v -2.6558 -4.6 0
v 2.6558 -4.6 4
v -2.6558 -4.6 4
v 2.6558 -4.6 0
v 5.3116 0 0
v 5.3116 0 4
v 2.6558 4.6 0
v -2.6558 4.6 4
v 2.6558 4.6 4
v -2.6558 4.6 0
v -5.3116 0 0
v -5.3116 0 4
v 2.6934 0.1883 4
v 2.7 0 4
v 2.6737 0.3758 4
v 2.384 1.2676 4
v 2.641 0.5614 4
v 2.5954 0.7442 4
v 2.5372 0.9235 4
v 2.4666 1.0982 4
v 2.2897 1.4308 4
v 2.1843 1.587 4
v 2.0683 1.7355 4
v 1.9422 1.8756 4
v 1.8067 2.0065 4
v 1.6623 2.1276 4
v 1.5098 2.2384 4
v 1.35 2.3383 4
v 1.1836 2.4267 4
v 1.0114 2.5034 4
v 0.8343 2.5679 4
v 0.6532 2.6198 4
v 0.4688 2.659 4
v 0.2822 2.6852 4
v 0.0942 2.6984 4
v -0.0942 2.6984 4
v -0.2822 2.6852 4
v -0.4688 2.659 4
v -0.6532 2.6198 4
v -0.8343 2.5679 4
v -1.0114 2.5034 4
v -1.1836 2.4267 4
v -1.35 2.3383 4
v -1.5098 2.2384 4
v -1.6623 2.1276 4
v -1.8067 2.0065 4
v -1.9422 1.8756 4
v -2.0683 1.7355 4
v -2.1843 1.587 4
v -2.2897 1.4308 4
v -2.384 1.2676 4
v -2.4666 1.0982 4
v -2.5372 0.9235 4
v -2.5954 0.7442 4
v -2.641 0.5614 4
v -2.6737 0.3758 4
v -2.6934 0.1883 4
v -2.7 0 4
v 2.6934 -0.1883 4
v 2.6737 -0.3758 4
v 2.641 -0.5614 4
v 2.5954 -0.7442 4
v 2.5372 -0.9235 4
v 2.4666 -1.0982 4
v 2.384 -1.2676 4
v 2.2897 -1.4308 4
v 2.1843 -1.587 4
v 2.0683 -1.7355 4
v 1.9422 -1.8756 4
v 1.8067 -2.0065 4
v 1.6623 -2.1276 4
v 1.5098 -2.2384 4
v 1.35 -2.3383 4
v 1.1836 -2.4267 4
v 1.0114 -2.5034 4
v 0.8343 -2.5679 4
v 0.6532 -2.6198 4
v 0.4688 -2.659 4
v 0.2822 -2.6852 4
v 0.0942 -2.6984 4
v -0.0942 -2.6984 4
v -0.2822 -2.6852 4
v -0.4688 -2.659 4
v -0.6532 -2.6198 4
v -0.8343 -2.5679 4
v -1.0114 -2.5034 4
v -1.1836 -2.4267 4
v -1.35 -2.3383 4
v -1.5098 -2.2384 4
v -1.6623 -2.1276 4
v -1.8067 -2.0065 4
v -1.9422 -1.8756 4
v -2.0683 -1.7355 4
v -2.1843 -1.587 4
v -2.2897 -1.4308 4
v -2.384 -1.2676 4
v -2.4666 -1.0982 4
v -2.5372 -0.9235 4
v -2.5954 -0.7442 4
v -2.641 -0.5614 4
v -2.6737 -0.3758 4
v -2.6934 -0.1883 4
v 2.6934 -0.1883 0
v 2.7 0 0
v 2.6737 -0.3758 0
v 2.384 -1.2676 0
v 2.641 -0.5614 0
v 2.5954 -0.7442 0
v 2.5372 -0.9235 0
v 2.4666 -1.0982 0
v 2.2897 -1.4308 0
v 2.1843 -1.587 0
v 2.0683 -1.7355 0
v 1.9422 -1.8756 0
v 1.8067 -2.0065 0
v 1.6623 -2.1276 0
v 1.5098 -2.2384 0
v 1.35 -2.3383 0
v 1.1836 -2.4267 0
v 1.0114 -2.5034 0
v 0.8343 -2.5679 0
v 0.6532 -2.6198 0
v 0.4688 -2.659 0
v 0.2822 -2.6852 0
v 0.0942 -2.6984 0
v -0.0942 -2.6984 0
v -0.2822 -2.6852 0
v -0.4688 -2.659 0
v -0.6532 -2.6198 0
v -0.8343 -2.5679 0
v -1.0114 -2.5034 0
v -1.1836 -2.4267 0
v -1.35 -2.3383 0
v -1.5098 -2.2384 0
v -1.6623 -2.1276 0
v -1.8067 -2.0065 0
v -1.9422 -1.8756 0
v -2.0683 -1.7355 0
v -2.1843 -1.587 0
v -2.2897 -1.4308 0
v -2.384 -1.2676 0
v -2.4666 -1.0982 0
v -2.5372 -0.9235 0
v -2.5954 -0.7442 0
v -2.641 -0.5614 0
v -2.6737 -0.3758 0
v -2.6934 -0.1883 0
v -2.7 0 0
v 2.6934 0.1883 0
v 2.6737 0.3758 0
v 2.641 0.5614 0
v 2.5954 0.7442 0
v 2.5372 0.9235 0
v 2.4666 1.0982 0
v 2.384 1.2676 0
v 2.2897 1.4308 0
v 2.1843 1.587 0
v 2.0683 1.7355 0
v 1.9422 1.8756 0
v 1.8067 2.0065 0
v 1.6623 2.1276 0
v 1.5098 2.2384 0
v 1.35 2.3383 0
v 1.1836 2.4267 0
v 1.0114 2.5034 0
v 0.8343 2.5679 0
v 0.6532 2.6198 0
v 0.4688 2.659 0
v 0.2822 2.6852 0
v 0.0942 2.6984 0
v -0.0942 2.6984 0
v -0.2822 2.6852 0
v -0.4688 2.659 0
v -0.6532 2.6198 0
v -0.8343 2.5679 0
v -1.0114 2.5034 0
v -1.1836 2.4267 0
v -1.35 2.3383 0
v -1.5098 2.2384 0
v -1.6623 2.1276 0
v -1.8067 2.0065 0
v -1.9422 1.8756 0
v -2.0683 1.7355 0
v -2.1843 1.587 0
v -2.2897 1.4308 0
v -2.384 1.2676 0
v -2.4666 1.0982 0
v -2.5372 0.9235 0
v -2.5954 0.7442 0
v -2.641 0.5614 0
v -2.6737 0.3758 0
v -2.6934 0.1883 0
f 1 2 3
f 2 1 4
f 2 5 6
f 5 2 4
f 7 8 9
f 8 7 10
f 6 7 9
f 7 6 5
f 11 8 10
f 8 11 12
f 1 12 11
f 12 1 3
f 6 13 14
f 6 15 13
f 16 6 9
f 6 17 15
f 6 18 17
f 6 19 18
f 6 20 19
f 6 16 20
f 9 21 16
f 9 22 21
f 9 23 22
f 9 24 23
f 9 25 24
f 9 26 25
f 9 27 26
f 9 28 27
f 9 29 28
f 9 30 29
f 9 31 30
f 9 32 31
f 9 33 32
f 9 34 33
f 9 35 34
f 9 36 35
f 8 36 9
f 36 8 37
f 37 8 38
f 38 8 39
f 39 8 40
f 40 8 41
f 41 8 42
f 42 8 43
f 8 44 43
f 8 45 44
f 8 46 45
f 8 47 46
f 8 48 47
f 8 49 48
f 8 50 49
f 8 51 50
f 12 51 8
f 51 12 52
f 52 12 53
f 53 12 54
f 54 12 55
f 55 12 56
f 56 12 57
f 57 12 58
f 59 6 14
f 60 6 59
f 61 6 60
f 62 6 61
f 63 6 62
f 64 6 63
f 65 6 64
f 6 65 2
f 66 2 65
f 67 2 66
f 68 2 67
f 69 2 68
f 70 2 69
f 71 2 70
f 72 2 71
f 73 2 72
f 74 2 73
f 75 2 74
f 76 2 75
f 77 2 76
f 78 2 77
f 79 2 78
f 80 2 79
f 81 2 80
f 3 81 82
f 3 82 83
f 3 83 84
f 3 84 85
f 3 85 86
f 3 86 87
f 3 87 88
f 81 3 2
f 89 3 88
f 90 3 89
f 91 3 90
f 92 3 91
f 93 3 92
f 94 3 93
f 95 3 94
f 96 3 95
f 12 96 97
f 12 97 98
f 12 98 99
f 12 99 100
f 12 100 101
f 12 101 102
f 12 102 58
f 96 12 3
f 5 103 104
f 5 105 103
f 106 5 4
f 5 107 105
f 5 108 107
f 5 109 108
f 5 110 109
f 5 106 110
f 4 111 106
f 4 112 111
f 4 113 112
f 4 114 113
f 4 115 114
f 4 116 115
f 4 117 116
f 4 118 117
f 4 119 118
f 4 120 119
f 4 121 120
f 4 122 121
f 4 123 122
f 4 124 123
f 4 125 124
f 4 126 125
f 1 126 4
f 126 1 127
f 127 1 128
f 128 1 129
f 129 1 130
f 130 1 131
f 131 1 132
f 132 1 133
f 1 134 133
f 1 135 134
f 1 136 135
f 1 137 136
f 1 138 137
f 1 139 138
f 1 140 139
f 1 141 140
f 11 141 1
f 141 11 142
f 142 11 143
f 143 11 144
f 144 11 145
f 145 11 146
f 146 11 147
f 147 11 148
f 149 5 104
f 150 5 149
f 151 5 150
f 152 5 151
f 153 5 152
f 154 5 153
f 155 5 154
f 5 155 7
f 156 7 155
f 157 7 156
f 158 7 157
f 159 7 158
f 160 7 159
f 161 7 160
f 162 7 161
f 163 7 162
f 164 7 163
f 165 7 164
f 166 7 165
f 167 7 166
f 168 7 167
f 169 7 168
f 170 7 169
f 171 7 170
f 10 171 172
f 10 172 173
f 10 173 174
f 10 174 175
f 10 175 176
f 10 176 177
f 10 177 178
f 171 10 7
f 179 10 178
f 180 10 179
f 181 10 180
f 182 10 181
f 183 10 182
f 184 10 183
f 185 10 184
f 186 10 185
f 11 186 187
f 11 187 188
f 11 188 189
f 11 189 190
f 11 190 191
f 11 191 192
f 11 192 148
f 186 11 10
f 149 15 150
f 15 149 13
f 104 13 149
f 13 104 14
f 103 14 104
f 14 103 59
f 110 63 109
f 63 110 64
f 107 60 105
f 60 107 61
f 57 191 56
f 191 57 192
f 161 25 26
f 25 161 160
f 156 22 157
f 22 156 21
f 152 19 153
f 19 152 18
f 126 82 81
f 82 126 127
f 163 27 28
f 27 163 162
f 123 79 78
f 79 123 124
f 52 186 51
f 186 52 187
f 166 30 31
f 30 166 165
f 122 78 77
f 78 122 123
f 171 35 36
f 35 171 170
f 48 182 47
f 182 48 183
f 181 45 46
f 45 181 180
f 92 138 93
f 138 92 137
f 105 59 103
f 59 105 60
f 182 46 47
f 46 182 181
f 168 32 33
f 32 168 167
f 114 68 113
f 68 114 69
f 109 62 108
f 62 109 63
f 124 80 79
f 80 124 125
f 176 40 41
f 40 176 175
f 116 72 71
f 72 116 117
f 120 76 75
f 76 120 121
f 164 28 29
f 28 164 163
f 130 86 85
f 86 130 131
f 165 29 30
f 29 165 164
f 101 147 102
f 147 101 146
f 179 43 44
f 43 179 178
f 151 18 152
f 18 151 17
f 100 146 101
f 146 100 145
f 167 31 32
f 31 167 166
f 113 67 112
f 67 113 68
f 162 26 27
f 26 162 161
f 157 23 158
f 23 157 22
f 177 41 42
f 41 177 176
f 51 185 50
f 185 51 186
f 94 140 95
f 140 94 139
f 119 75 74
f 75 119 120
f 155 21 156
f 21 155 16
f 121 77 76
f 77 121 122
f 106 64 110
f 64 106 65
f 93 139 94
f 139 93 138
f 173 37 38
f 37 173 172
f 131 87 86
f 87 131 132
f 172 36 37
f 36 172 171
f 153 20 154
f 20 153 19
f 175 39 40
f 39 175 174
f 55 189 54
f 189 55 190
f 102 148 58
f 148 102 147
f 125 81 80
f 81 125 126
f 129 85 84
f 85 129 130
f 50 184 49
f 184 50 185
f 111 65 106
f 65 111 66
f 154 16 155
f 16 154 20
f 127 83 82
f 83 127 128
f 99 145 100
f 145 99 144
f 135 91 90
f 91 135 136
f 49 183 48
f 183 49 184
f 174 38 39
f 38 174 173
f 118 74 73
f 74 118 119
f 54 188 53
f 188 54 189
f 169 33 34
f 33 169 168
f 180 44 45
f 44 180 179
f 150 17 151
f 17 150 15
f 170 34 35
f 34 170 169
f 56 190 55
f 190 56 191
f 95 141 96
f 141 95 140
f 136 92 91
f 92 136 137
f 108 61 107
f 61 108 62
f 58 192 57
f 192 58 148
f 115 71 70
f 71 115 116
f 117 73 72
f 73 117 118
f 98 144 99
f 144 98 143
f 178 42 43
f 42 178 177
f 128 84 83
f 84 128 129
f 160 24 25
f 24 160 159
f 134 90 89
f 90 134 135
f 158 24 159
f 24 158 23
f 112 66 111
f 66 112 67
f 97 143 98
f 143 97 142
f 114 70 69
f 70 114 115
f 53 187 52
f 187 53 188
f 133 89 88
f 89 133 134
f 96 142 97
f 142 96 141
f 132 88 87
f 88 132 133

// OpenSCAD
$fn = 120;

screw_d = 5.0;          // nominal screw diameter (mm)
clearance = 0.4;        // typical clearance for M5 (mm)
hole_d = screw_d + clearance;

across_flats = 9.2;     // mm
thickness = 4.0;        // mm

// For a regular hexagon: across_flats = sqrt(3) * circumradius
R = across_flats / sqrt(3);

difference() {
    cylinder(h = thickness, r = R, $fn = 6);
    translate([0,0,-0.1]) cylinder(h = thickness + 0.2, d = hole_d, $fn = 90);
}
